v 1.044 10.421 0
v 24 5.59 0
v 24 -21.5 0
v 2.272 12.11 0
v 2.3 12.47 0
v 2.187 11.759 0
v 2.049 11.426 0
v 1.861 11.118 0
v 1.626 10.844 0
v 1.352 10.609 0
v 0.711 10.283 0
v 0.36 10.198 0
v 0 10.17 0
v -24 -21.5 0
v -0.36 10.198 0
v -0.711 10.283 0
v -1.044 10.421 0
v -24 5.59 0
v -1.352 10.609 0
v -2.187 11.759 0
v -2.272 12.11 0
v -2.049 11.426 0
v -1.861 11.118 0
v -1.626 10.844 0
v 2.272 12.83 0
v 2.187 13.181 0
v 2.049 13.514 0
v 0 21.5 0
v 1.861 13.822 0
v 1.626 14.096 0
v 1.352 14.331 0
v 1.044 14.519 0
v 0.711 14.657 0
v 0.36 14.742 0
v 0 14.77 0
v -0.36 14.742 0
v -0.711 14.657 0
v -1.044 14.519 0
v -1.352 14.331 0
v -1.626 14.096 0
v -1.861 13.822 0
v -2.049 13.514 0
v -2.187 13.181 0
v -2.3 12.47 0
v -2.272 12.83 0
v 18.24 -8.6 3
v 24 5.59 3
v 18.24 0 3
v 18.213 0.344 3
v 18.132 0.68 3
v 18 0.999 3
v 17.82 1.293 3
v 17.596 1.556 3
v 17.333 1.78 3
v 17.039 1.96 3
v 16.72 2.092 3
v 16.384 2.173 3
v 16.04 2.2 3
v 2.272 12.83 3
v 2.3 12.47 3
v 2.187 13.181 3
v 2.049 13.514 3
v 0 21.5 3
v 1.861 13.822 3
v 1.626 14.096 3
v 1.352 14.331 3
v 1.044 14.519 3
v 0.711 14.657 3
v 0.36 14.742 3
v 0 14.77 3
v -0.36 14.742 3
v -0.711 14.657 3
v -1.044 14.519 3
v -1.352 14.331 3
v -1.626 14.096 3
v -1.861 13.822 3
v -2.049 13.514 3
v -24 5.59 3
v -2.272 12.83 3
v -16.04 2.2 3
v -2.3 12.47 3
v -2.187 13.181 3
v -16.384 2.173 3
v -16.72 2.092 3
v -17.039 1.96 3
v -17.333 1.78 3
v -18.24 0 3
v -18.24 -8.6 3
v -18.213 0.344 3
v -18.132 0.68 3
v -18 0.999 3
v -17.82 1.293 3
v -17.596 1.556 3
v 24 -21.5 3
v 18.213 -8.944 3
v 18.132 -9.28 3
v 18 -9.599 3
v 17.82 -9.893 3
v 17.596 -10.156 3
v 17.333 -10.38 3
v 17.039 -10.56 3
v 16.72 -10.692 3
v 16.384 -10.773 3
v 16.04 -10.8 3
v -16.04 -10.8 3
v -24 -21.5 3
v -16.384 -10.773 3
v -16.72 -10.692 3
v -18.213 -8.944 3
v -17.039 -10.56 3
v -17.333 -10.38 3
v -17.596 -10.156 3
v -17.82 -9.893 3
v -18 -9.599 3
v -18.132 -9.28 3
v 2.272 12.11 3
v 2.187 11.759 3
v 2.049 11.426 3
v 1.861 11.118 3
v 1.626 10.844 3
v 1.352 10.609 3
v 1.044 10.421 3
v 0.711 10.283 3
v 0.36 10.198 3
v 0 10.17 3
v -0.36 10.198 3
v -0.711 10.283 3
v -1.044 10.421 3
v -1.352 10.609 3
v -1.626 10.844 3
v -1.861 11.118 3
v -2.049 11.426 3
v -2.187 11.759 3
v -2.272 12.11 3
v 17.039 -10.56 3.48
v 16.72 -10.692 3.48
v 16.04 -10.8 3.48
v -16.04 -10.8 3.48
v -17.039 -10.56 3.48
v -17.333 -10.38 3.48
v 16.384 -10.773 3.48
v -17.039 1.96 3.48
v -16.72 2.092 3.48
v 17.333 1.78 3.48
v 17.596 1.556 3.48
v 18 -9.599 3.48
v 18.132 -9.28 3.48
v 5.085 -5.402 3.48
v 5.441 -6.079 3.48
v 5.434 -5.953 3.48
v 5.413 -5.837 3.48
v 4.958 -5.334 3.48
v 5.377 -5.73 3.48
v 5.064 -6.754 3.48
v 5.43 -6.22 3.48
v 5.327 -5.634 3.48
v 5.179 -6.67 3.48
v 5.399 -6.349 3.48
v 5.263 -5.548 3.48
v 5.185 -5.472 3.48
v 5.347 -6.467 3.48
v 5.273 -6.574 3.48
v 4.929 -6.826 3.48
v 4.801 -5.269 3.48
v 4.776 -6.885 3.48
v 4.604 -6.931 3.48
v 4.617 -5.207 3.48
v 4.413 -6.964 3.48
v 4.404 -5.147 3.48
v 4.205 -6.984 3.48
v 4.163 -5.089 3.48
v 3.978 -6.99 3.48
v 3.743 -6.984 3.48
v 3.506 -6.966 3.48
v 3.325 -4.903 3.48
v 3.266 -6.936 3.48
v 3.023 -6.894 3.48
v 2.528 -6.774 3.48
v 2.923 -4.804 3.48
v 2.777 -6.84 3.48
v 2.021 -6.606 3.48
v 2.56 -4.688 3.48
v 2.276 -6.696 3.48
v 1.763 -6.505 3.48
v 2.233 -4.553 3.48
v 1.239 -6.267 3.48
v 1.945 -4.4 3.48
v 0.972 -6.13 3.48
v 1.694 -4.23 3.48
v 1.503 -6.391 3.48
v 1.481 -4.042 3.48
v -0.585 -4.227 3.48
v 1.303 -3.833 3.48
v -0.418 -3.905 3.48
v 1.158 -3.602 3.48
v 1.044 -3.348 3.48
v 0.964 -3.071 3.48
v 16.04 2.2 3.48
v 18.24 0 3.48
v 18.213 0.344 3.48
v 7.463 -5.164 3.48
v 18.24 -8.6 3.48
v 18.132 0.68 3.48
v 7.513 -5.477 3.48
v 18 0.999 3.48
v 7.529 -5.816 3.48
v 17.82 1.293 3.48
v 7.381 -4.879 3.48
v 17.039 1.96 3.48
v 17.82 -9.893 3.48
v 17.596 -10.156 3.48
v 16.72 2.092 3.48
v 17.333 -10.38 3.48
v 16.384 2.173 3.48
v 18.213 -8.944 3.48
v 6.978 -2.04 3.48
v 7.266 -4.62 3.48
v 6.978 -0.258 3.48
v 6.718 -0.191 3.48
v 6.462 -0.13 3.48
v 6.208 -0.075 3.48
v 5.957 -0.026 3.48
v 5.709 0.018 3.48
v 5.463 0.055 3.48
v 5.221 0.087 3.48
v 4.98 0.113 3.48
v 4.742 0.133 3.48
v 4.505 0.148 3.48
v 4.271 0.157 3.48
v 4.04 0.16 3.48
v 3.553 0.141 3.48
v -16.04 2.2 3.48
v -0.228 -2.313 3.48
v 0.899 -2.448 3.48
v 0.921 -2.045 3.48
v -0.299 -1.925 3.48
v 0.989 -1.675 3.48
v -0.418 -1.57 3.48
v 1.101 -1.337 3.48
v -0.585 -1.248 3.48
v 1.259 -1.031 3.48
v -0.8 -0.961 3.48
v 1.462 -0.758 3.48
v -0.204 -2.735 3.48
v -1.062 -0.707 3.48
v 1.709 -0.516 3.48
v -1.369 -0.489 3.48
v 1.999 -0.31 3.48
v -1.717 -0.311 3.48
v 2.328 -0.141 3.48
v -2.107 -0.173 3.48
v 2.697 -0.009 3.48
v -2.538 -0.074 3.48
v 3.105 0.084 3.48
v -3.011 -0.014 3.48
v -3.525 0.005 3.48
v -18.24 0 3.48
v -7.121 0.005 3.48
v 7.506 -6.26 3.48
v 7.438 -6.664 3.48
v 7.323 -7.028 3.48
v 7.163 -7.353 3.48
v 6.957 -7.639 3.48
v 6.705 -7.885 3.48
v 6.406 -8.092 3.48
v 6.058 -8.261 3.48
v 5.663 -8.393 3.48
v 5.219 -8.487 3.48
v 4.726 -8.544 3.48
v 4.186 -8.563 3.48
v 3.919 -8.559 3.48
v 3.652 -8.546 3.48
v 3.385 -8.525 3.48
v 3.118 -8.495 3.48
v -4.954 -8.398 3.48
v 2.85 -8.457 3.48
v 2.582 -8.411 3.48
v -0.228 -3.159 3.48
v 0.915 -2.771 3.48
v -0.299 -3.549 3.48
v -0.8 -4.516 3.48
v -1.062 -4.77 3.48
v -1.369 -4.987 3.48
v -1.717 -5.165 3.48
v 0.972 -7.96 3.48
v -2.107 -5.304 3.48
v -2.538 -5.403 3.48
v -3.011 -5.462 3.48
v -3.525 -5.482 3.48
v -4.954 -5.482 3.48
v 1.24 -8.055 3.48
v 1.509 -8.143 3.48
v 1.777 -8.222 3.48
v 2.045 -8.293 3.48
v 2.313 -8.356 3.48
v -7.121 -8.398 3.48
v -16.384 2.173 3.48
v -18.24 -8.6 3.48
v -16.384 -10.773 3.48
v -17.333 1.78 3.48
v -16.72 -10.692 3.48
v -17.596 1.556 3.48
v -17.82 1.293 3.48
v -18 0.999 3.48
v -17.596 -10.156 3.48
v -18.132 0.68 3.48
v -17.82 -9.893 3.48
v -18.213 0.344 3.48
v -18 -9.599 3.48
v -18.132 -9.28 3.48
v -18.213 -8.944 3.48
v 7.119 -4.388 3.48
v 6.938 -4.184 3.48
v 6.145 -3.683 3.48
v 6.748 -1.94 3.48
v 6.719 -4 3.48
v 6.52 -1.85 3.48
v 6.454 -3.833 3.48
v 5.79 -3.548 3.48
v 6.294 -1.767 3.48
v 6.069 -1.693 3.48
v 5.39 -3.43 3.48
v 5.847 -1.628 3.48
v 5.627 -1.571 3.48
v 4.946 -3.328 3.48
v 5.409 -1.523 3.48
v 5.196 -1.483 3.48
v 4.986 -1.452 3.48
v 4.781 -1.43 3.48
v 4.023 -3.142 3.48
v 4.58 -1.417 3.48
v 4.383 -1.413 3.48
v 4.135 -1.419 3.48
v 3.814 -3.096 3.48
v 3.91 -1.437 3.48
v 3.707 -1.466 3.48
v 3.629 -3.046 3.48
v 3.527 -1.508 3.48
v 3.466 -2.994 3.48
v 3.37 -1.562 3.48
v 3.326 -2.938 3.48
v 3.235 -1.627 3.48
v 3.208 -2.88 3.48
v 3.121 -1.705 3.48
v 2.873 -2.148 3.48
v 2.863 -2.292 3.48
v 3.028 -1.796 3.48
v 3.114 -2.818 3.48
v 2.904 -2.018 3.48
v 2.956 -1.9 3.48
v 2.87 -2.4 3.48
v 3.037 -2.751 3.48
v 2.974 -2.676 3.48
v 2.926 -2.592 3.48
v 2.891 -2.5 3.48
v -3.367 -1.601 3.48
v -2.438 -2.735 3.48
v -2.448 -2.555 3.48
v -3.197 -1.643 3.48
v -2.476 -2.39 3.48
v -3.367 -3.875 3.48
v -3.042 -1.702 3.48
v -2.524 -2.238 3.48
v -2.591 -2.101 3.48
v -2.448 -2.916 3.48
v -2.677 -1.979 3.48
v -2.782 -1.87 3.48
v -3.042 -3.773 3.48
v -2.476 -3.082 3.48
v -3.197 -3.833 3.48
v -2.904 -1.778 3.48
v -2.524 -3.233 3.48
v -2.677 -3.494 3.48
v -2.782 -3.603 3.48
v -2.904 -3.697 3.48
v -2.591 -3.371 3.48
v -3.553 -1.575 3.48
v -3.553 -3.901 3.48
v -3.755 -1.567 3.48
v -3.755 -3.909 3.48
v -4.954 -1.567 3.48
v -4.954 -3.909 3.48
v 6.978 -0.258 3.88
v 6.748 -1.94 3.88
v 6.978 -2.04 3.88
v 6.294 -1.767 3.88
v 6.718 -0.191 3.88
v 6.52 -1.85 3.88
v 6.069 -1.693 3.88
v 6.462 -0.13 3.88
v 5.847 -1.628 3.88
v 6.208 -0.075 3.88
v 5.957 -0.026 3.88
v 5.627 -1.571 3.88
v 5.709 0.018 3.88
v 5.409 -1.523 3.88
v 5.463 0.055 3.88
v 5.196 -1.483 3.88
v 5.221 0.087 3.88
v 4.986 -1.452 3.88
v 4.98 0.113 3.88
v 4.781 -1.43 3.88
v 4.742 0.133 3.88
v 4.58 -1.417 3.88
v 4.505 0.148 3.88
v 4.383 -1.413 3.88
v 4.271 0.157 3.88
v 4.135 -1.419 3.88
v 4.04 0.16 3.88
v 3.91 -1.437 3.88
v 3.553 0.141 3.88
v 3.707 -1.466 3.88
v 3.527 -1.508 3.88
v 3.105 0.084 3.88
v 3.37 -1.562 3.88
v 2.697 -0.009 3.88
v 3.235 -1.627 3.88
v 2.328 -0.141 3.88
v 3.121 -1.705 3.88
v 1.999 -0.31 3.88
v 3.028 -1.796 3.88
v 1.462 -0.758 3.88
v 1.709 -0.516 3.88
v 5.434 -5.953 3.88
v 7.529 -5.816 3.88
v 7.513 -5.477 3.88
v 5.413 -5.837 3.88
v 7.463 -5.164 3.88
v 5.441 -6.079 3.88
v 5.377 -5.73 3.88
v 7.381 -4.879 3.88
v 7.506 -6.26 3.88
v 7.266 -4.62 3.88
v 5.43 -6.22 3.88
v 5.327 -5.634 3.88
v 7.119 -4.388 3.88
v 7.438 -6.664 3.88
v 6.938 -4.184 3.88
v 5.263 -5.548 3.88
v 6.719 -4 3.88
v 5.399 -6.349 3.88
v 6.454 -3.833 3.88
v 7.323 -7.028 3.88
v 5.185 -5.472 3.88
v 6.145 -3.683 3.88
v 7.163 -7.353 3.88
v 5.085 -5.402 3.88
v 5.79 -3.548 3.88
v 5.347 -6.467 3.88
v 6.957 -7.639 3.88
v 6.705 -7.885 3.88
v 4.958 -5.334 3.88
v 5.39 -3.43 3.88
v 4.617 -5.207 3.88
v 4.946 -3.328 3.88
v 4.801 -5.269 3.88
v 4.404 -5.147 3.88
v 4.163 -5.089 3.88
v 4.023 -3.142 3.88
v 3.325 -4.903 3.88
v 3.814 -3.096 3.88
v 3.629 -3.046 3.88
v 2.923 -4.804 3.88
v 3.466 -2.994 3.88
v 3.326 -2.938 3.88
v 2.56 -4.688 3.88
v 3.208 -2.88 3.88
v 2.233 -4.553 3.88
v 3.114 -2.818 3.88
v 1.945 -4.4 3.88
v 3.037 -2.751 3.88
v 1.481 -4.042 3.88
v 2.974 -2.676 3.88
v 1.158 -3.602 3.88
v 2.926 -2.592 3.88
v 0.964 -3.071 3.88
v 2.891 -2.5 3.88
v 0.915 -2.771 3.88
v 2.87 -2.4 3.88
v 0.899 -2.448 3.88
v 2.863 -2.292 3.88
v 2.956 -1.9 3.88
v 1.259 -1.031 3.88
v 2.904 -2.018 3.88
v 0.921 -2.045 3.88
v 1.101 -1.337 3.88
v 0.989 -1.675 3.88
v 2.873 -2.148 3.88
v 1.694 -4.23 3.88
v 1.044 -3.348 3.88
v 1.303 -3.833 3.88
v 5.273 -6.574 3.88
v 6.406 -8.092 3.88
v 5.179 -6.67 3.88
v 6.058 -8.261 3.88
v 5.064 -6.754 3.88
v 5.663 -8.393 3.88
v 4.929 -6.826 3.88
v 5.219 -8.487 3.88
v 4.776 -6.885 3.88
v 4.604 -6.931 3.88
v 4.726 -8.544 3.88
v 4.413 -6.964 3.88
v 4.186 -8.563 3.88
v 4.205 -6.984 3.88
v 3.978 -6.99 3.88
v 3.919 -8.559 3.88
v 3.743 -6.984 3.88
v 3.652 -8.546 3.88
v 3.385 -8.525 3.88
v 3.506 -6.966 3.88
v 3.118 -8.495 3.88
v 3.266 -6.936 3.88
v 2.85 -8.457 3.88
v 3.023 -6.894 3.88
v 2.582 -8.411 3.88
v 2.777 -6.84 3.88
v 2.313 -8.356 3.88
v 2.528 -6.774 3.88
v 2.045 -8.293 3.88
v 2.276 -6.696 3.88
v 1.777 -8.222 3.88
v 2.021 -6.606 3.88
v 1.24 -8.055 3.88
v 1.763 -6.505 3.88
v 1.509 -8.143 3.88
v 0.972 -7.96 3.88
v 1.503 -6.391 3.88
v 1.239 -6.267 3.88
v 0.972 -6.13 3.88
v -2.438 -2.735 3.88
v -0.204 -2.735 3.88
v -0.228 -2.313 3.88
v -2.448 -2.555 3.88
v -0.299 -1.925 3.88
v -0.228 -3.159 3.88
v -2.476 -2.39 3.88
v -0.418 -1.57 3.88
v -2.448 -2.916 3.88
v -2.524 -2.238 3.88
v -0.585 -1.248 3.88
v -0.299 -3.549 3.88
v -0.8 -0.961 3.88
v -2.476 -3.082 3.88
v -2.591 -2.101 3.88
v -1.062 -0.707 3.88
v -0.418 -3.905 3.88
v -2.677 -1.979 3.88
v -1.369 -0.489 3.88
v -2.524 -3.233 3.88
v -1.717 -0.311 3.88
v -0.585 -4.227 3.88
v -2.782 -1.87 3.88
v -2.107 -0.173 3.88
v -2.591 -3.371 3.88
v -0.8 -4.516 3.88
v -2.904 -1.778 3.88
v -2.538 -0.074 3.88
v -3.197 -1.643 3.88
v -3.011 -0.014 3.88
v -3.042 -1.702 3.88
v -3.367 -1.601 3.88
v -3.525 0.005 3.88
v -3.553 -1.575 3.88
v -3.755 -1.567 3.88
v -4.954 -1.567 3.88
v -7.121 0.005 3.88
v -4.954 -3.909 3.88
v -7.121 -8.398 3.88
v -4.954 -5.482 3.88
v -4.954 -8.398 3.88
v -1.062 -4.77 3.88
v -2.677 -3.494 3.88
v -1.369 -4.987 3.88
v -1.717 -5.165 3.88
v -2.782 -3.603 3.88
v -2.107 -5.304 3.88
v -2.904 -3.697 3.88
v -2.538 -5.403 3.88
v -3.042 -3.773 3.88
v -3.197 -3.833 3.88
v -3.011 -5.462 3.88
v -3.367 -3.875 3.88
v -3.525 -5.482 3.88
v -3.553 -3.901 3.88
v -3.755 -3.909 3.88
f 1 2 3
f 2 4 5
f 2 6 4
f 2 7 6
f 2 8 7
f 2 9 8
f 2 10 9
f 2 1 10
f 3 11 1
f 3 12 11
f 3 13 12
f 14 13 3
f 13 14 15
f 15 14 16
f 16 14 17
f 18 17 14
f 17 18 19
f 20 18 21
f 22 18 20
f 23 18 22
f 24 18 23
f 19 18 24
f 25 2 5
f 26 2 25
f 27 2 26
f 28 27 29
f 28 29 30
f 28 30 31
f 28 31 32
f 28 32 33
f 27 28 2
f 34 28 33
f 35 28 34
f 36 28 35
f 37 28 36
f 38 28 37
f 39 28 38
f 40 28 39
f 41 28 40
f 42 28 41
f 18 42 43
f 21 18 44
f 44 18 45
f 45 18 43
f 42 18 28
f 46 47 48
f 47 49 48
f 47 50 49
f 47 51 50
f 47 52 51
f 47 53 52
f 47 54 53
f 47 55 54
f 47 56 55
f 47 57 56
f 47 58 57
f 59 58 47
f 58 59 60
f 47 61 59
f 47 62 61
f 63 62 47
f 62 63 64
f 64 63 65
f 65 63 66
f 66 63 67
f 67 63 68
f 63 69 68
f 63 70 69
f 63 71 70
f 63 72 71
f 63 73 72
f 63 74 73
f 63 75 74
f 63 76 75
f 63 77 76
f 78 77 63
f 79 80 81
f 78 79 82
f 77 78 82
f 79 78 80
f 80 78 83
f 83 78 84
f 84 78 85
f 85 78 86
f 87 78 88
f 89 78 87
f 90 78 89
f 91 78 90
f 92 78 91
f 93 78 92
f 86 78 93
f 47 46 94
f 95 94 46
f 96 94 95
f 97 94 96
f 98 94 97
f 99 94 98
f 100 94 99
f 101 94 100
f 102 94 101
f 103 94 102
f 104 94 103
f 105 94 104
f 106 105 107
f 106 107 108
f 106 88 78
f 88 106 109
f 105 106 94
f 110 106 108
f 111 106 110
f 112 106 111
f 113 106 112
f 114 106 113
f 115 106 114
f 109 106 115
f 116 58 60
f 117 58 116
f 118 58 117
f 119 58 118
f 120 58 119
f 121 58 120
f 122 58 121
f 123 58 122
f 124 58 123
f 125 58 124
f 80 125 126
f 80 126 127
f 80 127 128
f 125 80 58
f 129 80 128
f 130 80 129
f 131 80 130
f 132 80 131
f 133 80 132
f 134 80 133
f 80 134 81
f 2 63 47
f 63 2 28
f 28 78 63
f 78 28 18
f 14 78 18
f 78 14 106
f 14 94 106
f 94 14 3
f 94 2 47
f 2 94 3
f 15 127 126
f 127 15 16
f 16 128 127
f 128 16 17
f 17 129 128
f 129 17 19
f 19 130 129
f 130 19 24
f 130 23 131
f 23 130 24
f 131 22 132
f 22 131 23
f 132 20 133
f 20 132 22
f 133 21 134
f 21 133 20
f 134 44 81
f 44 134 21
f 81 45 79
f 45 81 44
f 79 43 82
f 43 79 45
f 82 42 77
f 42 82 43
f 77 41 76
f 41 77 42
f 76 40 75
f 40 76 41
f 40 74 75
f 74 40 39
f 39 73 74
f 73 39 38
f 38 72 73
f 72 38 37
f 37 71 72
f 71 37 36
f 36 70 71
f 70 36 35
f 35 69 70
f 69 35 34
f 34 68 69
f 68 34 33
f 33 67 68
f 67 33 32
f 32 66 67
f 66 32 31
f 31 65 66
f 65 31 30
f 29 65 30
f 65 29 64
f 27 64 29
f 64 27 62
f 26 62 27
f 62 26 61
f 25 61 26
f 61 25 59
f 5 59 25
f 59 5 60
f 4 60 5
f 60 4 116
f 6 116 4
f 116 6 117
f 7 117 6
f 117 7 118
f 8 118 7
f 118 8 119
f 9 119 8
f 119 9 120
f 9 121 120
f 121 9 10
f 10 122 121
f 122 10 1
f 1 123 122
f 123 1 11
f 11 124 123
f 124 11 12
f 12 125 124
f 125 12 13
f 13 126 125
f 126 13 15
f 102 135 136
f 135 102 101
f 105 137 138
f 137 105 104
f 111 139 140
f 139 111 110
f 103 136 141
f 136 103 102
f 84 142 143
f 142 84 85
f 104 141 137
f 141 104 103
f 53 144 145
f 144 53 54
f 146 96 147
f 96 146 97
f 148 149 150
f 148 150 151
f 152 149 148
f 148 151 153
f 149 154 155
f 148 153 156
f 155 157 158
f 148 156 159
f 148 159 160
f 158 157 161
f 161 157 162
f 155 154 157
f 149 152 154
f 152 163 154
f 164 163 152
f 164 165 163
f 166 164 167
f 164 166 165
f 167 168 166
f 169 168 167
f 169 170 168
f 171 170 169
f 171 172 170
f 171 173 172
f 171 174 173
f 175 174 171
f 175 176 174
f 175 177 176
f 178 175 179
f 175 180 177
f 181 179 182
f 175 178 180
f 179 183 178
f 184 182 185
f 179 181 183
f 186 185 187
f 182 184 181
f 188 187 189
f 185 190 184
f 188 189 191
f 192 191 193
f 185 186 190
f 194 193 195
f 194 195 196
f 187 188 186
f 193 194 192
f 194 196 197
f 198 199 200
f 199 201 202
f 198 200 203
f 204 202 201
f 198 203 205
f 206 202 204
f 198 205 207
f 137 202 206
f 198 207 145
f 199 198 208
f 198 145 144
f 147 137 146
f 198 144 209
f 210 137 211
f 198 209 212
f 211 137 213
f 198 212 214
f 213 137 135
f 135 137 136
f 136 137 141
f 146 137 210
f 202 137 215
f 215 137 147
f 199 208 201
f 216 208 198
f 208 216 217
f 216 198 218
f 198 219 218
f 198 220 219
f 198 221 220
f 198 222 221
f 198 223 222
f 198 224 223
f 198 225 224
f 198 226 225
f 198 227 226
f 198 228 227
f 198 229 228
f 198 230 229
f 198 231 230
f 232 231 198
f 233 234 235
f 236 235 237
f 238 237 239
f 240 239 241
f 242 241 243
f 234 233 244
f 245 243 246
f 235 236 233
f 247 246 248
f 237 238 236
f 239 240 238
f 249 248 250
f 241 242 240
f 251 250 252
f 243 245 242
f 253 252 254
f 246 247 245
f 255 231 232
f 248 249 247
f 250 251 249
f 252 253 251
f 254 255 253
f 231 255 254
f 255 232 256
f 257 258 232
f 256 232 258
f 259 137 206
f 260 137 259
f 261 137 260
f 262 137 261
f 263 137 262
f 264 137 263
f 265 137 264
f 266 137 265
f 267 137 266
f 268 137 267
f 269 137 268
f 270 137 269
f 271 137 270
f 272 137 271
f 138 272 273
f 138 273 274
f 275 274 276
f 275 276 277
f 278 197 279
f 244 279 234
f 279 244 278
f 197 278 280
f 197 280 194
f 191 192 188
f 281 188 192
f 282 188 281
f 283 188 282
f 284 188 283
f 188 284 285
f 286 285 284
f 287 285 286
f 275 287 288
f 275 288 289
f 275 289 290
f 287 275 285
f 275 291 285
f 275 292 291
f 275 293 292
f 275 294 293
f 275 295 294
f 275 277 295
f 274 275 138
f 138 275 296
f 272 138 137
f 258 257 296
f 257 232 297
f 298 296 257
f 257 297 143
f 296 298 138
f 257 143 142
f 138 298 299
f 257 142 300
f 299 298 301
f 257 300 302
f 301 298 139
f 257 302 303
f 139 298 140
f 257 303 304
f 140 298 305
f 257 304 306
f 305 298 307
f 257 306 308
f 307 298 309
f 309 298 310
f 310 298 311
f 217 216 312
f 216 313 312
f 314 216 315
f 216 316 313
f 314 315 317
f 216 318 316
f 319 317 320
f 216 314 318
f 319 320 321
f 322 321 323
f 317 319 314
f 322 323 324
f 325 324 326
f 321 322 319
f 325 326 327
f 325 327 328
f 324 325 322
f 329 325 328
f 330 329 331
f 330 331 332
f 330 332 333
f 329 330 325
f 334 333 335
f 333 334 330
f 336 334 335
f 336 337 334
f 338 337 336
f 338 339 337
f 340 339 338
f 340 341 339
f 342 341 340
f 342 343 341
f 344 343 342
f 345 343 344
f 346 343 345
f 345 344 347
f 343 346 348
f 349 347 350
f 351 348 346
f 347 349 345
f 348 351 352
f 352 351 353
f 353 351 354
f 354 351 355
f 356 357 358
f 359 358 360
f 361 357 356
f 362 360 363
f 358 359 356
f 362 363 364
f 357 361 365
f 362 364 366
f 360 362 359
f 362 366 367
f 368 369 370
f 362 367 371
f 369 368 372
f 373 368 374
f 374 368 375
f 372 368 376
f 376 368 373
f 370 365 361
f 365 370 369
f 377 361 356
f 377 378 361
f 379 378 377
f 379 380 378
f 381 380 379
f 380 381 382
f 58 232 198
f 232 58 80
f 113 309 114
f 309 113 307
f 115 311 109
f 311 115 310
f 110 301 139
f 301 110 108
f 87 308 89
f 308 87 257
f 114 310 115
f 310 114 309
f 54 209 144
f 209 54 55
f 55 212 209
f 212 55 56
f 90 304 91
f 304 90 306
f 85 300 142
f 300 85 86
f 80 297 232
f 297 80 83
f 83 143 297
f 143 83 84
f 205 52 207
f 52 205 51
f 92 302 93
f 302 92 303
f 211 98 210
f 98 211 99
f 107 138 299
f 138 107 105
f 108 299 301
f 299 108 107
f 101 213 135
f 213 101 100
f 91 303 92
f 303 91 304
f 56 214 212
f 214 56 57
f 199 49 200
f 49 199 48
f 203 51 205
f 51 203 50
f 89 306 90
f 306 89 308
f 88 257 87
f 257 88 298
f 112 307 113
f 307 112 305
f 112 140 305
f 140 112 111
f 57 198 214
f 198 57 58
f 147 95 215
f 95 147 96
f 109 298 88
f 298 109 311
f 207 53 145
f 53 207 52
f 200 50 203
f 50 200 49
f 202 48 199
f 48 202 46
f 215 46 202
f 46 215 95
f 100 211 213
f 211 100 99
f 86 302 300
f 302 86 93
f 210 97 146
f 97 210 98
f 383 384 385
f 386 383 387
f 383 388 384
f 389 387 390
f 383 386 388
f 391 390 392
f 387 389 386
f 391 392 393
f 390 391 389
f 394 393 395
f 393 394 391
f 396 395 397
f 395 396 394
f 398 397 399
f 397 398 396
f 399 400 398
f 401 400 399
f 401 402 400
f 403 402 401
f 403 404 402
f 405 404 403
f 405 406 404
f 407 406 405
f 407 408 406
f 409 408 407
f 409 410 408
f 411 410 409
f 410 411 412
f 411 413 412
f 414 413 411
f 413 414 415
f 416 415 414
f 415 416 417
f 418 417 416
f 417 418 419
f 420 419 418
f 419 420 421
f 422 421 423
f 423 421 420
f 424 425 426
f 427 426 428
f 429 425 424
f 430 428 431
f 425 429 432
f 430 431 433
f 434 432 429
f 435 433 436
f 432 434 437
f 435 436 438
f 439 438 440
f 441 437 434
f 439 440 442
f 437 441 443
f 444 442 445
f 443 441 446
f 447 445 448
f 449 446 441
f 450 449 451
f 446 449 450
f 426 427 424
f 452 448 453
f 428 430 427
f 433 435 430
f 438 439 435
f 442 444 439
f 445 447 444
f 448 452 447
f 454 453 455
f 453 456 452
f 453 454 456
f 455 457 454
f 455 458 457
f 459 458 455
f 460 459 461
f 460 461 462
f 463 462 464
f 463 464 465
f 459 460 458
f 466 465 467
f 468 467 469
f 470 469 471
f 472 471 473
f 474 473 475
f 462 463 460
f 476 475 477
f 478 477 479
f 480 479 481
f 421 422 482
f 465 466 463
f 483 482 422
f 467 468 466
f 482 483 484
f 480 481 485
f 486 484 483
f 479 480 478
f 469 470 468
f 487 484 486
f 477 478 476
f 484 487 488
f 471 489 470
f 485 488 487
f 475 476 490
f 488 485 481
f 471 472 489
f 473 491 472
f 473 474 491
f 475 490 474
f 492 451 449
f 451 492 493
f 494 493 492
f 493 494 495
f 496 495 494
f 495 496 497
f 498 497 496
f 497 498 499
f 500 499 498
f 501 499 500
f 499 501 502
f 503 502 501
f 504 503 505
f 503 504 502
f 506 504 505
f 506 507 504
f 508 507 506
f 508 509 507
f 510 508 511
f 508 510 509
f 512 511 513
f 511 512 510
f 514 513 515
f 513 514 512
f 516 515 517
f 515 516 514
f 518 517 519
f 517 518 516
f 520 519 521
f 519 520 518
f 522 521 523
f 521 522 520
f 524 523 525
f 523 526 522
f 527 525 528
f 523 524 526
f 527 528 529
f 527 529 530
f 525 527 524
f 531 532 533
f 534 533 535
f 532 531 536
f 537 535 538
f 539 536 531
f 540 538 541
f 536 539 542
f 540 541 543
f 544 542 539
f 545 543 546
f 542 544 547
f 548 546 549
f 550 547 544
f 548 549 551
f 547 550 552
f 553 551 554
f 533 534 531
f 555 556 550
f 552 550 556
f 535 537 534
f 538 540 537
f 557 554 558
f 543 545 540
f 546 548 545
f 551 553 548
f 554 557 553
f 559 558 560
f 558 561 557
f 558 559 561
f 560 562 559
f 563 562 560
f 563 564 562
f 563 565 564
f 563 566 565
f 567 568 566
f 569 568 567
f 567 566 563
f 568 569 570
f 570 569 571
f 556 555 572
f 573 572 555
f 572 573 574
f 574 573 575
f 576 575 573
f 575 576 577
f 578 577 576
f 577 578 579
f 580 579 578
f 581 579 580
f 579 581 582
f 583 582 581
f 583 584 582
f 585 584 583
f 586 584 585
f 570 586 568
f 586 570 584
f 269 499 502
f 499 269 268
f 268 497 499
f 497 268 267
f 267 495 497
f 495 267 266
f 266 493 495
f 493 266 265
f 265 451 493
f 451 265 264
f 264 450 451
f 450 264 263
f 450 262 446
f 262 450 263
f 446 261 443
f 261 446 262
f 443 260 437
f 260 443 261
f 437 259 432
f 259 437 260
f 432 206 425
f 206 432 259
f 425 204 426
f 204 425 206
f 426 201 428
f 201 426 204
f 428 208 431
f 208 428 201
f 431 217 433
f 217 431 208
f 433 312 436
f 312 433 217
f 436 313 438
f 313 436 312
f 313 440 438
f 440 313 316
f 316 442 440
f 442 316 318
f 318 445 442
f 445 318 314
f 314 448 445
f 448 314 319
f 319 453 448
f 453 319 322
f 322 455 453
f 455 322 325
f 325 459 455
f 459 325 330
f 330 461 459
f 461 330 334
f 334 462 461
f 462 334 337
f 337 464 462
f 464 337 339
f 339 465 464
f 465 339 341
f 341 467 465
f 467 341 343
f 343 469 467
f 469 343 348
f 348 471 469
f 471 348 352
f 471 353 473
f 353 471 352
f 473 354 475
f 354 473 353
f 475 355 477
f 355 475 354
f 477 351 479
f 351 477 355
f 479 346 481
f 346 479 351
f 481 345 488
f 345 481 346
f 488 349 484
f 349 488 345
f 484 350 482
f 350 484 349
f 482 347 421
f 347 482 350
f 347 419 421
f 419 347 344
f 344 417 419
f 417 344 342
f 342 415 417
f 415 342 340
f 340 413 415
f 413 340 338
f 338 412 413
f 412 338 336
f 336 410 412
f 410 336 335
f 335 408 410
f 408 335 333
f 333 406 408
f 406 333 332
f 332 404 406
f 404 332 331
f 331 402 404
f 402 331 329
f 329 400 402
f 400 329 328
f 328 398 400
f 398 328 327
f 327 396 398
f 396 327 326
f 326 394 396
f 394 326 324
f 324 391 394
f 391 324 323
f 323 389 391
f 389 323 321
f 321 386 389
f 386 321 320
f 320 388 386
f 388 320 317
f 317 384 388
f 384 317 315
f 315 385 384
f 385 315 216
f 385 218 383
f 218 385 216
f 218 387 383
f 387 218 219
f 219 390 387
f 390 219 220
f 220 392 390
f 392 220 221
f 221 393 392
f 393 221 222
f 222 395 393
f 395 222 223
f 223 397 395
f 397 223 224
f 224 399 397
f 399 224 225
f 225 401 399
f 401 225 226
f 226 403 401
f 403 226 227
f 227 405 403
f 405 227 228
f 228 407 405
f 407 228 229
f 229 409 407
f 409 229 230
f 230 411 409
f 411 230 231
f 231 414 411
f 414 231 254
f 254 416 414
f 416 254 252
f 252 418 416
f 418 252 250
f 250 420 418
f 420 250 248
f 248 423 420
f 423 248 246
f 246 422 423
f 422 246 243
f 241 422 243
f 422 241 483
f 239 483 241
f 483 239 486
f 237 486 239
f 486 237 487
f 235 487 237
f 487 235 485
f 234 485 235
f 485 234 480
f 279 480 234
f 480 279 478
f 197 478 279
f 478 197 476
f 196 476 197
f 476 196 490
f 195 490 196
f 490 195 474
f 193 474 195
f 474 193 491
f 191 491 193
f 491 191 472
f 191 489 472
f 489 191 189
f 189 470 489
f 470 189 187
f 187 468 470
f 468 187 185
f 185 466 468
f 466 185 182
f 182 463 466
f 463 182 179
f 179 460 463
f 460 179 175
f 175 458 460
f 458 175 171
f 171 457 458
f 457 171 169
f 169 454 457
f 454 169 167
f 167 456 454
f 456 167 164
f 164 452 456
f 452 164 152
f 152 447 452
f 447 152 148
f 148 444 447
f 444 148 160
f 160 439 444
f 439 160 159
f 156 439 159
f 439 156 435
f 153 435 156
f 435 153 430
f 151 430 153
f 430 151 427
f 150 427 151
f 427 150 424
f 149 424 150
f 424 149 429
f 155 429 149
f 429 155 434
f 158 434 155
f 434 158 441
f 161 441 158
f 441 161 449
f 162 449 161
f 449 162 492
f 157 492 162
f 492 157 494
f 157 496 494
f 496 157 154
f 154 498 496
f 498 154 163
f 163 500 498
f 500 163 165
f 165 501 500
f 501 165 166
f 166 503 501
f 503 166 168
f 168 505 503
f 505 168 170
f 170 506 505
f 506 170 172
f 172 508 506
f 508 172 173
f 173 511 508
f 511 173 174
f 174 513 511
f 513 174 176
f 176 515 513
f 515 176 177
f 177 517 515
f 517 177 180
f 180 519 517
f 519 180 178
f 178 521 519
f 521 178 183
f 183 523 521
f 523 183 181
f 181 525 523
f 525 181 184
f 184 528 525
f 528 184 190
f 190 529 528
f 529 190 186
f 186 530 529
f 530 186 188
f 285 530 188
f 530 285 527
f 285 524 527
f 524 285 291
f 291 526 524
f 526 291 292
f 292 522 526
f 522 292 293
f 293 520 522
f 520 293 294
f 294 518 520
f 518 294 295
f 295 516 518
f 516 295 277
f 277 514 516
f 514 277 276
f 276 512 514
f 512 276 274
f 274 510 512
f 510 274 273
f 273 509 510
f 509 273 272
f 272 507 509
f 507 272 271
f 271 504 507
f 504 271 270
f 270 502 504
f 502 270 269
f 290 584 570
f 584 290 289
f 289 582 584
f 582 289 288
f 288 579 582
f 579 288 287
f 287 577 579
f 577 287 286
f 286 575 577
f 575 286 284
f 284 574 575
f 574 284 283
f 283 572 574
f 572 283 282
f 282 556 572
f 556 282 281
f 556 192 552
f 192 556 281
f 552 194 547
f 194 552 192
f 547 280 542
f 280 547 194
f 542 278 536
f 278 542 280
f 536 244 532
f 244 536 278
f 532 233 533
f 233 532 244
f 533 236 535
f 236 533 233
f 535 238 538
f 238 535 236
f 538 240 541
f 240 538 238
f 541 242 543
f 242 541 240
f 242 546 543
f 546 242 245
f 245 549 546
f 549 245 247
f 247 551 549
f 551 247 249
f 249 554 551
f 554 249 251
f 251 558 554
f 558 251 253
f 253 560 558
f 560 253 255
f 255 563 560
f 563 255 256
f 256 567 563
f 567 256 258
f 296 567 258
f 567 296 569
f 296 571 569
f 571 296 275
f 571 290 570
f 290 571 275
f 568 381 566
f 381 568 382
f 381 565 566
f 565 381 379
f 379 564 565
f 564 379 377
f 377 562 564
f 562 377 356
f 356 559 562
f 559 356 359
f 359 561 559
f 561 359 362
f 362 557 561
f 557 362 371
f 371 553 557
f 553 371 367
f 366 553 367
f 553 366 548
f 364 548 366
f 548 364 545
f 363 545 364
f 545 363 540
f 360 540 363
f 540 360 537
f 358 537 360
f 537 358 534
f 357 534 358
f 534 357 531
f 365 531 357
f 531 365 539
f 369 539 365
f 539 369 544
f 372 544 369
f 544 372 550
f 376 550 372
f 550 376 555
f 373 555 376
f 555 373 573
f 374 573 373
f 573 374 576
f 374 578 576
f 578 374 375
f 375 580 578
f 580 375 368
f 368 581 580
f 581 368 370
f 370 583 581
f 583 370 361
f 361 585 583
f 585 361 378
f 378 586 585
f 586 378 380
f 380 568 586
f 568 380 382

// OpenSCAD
// POLSOLIDE — Brelok „Domek”
// Materiały: base=czarny (#18181B); red=czerwony (#B7131C); white=biały (#F1F0EC).
// Zapisz do STL: openscad -o element.stl -D 'part="base"' tenplik.scad
// Model na płasko: wszystkie barwy zmieniają się tylko na samym końcu druku.
$fn=40;
part="all"; // all, base, red, white
W=48; H=43; T=3.0; kind="house";
RH=0.48; WH=0.40; // wysokość czerwonego i białego detalowania
magnet=false;
label=""; // zmień np. numer lokalu, oznaczenie stanowiska lub pomieszczenia

module rr(w,h,r){offset(r=r) square([max(0.1,w-2*r),max(0.1,h-2*r)],center=true);}
module outline(){
 if(kind=="house")polygon(points=[[-W/2,-H/2],[W/2,-H/2],[W/2,H*.13],[0,H/2],[-W/2,H*.13]]);
 else if(kind=="shield")polygon(points=[[-W*.46,H*.48],[W*.46,H*.48],[W*.49,-H*.05],[W*.25,-H*.32],[0,-H*.49],[-W*.25,-H*.32],[-W*.49,-H*.05]]);
 else if(kind=="hex")polygon(points=[[-W*.35,-H/2],[W*.35,-H/2],[W/2,0],[W*.35,H/2],[-W*.35,H/2],[-W/2,0]]);
 else if(kind=="oval")scale([W/2,H/2])circle(r=1,$fn=60);
 else if(kind=="coin")circle(d=W,$fn=72);
 else if(kind=="plaque")rr(W,H,3.0);
 else if(kind=="luggage")rr(W,H,6.5);
 else if(kind=="arch")union(){translate([0,-H*.10])rr(W,H*.8,5);translate([0,H*.14])scale([W/2,H*.37])circle(r=1,$fn=48);}
 else if(kind=="key") union(){translate([-W*.3,0])circle(d=H,$fn=48);translate([W*.08,-H*.16])square([W*.68,H*.32],center=true);translate([W*.31,-H*.27])square([W*.11,H*.20],center=true);translate([W*.42,-H*.27])square([W*.09,H*.20],center=true);}
 else if(kind=="tag")union(){rr(W-7,H,5);translate([-W/2+5,0])circle(d=H*.78,$fn=48);}
 else rr(W,H,5);
}
module hole2d(){
 if(kind=="house")translate([0,H*.29])circle(d=4.6,$fn=40);
 else if(kind=="shield")translate([0,H*.34])circle(d=4.6,$fn=40);
 else if(kind=="key")translate([-W*.3,0])circle(d=4.6,$fn=40);
 else if(kind=="oval" && !magnet)translate([-W*.34,0])circle(d=4.6,$fn=40);
 else if(kind=="tag")translate([-W*.36,0])circle(d=4.6,$fn=40);
 else if(kind=="luggage")translate([-W*.40,0])circle(d=5,$fn=40);
}
module footprint(){difference(){outline(); if(!magnet)hole2d();}}
// W małych produktach monogram PS jest większy i czytelniejszy przy dyszy 0.4 mm.
small=(W<=50 || kind=="coin" || kind=="hex");
bw= min(W*.76,64);
bh=(label=="")?(small?13:15):20;
// dla breloka w kształcie klucza środek znaku przesunięto od oczka
badgeX=(kind=="key")?W*.13:(kind=="oval"&&!magnet?W*.055:(kind=="tag"?W*.07:(kind=="luggage"?W*.03:0)));
badgeY=(kind=="house" || kind=="shield")?-H*.10:0;
module brand_patch(){translate([badgeX,badgeY])rr(bw,bh,2.2);}
module base_black(){difference(){linear_extrude(height=T,convexity=8)footprint();
 if(magnet)translate([0,0,-0.02])cylinder(h=2.14,d=10.35,$fn=48);
}}
module red_cap(){translate([0,0,T])linear_extrude(height=RH)intersection(){offset(delta=-.55)footprint();brand_patch();}}
module white_brand(){
 translate([badgeX,badgeY,T+RH])linear_extrude(height=WH)
 if(label!="") {
   translate([0,3.8])text("POLSOLIDE",font="DejaVu Sans:style=Bold",size=min(4.0,bw*.087),halign="center",valign="center");
   translate([0,-4.0])text(label,font="DejaVu Sans:style=Bold",size=min(6.4,bw/(max(2,len(label))*0.75)),halign="center",valign="center");
 }
 else if(small) text("PS",font="DejaVu Sans:style=Bold",size=8.3,halign="center",valign="center");
 else text("POLSOLIDE",font="DejaVu Sans:style=Bold",size=min(6.4,bw*.127),halign="center",valign="center");
}
if(part=="all"||part=="base")color([.094,.094,.106])base_black();
if(part=="all"||part=="red")color([.718,.075,.11])red_cap();
if(part=="all"||part=="white")color([.945,.941,.925])white_brand();
